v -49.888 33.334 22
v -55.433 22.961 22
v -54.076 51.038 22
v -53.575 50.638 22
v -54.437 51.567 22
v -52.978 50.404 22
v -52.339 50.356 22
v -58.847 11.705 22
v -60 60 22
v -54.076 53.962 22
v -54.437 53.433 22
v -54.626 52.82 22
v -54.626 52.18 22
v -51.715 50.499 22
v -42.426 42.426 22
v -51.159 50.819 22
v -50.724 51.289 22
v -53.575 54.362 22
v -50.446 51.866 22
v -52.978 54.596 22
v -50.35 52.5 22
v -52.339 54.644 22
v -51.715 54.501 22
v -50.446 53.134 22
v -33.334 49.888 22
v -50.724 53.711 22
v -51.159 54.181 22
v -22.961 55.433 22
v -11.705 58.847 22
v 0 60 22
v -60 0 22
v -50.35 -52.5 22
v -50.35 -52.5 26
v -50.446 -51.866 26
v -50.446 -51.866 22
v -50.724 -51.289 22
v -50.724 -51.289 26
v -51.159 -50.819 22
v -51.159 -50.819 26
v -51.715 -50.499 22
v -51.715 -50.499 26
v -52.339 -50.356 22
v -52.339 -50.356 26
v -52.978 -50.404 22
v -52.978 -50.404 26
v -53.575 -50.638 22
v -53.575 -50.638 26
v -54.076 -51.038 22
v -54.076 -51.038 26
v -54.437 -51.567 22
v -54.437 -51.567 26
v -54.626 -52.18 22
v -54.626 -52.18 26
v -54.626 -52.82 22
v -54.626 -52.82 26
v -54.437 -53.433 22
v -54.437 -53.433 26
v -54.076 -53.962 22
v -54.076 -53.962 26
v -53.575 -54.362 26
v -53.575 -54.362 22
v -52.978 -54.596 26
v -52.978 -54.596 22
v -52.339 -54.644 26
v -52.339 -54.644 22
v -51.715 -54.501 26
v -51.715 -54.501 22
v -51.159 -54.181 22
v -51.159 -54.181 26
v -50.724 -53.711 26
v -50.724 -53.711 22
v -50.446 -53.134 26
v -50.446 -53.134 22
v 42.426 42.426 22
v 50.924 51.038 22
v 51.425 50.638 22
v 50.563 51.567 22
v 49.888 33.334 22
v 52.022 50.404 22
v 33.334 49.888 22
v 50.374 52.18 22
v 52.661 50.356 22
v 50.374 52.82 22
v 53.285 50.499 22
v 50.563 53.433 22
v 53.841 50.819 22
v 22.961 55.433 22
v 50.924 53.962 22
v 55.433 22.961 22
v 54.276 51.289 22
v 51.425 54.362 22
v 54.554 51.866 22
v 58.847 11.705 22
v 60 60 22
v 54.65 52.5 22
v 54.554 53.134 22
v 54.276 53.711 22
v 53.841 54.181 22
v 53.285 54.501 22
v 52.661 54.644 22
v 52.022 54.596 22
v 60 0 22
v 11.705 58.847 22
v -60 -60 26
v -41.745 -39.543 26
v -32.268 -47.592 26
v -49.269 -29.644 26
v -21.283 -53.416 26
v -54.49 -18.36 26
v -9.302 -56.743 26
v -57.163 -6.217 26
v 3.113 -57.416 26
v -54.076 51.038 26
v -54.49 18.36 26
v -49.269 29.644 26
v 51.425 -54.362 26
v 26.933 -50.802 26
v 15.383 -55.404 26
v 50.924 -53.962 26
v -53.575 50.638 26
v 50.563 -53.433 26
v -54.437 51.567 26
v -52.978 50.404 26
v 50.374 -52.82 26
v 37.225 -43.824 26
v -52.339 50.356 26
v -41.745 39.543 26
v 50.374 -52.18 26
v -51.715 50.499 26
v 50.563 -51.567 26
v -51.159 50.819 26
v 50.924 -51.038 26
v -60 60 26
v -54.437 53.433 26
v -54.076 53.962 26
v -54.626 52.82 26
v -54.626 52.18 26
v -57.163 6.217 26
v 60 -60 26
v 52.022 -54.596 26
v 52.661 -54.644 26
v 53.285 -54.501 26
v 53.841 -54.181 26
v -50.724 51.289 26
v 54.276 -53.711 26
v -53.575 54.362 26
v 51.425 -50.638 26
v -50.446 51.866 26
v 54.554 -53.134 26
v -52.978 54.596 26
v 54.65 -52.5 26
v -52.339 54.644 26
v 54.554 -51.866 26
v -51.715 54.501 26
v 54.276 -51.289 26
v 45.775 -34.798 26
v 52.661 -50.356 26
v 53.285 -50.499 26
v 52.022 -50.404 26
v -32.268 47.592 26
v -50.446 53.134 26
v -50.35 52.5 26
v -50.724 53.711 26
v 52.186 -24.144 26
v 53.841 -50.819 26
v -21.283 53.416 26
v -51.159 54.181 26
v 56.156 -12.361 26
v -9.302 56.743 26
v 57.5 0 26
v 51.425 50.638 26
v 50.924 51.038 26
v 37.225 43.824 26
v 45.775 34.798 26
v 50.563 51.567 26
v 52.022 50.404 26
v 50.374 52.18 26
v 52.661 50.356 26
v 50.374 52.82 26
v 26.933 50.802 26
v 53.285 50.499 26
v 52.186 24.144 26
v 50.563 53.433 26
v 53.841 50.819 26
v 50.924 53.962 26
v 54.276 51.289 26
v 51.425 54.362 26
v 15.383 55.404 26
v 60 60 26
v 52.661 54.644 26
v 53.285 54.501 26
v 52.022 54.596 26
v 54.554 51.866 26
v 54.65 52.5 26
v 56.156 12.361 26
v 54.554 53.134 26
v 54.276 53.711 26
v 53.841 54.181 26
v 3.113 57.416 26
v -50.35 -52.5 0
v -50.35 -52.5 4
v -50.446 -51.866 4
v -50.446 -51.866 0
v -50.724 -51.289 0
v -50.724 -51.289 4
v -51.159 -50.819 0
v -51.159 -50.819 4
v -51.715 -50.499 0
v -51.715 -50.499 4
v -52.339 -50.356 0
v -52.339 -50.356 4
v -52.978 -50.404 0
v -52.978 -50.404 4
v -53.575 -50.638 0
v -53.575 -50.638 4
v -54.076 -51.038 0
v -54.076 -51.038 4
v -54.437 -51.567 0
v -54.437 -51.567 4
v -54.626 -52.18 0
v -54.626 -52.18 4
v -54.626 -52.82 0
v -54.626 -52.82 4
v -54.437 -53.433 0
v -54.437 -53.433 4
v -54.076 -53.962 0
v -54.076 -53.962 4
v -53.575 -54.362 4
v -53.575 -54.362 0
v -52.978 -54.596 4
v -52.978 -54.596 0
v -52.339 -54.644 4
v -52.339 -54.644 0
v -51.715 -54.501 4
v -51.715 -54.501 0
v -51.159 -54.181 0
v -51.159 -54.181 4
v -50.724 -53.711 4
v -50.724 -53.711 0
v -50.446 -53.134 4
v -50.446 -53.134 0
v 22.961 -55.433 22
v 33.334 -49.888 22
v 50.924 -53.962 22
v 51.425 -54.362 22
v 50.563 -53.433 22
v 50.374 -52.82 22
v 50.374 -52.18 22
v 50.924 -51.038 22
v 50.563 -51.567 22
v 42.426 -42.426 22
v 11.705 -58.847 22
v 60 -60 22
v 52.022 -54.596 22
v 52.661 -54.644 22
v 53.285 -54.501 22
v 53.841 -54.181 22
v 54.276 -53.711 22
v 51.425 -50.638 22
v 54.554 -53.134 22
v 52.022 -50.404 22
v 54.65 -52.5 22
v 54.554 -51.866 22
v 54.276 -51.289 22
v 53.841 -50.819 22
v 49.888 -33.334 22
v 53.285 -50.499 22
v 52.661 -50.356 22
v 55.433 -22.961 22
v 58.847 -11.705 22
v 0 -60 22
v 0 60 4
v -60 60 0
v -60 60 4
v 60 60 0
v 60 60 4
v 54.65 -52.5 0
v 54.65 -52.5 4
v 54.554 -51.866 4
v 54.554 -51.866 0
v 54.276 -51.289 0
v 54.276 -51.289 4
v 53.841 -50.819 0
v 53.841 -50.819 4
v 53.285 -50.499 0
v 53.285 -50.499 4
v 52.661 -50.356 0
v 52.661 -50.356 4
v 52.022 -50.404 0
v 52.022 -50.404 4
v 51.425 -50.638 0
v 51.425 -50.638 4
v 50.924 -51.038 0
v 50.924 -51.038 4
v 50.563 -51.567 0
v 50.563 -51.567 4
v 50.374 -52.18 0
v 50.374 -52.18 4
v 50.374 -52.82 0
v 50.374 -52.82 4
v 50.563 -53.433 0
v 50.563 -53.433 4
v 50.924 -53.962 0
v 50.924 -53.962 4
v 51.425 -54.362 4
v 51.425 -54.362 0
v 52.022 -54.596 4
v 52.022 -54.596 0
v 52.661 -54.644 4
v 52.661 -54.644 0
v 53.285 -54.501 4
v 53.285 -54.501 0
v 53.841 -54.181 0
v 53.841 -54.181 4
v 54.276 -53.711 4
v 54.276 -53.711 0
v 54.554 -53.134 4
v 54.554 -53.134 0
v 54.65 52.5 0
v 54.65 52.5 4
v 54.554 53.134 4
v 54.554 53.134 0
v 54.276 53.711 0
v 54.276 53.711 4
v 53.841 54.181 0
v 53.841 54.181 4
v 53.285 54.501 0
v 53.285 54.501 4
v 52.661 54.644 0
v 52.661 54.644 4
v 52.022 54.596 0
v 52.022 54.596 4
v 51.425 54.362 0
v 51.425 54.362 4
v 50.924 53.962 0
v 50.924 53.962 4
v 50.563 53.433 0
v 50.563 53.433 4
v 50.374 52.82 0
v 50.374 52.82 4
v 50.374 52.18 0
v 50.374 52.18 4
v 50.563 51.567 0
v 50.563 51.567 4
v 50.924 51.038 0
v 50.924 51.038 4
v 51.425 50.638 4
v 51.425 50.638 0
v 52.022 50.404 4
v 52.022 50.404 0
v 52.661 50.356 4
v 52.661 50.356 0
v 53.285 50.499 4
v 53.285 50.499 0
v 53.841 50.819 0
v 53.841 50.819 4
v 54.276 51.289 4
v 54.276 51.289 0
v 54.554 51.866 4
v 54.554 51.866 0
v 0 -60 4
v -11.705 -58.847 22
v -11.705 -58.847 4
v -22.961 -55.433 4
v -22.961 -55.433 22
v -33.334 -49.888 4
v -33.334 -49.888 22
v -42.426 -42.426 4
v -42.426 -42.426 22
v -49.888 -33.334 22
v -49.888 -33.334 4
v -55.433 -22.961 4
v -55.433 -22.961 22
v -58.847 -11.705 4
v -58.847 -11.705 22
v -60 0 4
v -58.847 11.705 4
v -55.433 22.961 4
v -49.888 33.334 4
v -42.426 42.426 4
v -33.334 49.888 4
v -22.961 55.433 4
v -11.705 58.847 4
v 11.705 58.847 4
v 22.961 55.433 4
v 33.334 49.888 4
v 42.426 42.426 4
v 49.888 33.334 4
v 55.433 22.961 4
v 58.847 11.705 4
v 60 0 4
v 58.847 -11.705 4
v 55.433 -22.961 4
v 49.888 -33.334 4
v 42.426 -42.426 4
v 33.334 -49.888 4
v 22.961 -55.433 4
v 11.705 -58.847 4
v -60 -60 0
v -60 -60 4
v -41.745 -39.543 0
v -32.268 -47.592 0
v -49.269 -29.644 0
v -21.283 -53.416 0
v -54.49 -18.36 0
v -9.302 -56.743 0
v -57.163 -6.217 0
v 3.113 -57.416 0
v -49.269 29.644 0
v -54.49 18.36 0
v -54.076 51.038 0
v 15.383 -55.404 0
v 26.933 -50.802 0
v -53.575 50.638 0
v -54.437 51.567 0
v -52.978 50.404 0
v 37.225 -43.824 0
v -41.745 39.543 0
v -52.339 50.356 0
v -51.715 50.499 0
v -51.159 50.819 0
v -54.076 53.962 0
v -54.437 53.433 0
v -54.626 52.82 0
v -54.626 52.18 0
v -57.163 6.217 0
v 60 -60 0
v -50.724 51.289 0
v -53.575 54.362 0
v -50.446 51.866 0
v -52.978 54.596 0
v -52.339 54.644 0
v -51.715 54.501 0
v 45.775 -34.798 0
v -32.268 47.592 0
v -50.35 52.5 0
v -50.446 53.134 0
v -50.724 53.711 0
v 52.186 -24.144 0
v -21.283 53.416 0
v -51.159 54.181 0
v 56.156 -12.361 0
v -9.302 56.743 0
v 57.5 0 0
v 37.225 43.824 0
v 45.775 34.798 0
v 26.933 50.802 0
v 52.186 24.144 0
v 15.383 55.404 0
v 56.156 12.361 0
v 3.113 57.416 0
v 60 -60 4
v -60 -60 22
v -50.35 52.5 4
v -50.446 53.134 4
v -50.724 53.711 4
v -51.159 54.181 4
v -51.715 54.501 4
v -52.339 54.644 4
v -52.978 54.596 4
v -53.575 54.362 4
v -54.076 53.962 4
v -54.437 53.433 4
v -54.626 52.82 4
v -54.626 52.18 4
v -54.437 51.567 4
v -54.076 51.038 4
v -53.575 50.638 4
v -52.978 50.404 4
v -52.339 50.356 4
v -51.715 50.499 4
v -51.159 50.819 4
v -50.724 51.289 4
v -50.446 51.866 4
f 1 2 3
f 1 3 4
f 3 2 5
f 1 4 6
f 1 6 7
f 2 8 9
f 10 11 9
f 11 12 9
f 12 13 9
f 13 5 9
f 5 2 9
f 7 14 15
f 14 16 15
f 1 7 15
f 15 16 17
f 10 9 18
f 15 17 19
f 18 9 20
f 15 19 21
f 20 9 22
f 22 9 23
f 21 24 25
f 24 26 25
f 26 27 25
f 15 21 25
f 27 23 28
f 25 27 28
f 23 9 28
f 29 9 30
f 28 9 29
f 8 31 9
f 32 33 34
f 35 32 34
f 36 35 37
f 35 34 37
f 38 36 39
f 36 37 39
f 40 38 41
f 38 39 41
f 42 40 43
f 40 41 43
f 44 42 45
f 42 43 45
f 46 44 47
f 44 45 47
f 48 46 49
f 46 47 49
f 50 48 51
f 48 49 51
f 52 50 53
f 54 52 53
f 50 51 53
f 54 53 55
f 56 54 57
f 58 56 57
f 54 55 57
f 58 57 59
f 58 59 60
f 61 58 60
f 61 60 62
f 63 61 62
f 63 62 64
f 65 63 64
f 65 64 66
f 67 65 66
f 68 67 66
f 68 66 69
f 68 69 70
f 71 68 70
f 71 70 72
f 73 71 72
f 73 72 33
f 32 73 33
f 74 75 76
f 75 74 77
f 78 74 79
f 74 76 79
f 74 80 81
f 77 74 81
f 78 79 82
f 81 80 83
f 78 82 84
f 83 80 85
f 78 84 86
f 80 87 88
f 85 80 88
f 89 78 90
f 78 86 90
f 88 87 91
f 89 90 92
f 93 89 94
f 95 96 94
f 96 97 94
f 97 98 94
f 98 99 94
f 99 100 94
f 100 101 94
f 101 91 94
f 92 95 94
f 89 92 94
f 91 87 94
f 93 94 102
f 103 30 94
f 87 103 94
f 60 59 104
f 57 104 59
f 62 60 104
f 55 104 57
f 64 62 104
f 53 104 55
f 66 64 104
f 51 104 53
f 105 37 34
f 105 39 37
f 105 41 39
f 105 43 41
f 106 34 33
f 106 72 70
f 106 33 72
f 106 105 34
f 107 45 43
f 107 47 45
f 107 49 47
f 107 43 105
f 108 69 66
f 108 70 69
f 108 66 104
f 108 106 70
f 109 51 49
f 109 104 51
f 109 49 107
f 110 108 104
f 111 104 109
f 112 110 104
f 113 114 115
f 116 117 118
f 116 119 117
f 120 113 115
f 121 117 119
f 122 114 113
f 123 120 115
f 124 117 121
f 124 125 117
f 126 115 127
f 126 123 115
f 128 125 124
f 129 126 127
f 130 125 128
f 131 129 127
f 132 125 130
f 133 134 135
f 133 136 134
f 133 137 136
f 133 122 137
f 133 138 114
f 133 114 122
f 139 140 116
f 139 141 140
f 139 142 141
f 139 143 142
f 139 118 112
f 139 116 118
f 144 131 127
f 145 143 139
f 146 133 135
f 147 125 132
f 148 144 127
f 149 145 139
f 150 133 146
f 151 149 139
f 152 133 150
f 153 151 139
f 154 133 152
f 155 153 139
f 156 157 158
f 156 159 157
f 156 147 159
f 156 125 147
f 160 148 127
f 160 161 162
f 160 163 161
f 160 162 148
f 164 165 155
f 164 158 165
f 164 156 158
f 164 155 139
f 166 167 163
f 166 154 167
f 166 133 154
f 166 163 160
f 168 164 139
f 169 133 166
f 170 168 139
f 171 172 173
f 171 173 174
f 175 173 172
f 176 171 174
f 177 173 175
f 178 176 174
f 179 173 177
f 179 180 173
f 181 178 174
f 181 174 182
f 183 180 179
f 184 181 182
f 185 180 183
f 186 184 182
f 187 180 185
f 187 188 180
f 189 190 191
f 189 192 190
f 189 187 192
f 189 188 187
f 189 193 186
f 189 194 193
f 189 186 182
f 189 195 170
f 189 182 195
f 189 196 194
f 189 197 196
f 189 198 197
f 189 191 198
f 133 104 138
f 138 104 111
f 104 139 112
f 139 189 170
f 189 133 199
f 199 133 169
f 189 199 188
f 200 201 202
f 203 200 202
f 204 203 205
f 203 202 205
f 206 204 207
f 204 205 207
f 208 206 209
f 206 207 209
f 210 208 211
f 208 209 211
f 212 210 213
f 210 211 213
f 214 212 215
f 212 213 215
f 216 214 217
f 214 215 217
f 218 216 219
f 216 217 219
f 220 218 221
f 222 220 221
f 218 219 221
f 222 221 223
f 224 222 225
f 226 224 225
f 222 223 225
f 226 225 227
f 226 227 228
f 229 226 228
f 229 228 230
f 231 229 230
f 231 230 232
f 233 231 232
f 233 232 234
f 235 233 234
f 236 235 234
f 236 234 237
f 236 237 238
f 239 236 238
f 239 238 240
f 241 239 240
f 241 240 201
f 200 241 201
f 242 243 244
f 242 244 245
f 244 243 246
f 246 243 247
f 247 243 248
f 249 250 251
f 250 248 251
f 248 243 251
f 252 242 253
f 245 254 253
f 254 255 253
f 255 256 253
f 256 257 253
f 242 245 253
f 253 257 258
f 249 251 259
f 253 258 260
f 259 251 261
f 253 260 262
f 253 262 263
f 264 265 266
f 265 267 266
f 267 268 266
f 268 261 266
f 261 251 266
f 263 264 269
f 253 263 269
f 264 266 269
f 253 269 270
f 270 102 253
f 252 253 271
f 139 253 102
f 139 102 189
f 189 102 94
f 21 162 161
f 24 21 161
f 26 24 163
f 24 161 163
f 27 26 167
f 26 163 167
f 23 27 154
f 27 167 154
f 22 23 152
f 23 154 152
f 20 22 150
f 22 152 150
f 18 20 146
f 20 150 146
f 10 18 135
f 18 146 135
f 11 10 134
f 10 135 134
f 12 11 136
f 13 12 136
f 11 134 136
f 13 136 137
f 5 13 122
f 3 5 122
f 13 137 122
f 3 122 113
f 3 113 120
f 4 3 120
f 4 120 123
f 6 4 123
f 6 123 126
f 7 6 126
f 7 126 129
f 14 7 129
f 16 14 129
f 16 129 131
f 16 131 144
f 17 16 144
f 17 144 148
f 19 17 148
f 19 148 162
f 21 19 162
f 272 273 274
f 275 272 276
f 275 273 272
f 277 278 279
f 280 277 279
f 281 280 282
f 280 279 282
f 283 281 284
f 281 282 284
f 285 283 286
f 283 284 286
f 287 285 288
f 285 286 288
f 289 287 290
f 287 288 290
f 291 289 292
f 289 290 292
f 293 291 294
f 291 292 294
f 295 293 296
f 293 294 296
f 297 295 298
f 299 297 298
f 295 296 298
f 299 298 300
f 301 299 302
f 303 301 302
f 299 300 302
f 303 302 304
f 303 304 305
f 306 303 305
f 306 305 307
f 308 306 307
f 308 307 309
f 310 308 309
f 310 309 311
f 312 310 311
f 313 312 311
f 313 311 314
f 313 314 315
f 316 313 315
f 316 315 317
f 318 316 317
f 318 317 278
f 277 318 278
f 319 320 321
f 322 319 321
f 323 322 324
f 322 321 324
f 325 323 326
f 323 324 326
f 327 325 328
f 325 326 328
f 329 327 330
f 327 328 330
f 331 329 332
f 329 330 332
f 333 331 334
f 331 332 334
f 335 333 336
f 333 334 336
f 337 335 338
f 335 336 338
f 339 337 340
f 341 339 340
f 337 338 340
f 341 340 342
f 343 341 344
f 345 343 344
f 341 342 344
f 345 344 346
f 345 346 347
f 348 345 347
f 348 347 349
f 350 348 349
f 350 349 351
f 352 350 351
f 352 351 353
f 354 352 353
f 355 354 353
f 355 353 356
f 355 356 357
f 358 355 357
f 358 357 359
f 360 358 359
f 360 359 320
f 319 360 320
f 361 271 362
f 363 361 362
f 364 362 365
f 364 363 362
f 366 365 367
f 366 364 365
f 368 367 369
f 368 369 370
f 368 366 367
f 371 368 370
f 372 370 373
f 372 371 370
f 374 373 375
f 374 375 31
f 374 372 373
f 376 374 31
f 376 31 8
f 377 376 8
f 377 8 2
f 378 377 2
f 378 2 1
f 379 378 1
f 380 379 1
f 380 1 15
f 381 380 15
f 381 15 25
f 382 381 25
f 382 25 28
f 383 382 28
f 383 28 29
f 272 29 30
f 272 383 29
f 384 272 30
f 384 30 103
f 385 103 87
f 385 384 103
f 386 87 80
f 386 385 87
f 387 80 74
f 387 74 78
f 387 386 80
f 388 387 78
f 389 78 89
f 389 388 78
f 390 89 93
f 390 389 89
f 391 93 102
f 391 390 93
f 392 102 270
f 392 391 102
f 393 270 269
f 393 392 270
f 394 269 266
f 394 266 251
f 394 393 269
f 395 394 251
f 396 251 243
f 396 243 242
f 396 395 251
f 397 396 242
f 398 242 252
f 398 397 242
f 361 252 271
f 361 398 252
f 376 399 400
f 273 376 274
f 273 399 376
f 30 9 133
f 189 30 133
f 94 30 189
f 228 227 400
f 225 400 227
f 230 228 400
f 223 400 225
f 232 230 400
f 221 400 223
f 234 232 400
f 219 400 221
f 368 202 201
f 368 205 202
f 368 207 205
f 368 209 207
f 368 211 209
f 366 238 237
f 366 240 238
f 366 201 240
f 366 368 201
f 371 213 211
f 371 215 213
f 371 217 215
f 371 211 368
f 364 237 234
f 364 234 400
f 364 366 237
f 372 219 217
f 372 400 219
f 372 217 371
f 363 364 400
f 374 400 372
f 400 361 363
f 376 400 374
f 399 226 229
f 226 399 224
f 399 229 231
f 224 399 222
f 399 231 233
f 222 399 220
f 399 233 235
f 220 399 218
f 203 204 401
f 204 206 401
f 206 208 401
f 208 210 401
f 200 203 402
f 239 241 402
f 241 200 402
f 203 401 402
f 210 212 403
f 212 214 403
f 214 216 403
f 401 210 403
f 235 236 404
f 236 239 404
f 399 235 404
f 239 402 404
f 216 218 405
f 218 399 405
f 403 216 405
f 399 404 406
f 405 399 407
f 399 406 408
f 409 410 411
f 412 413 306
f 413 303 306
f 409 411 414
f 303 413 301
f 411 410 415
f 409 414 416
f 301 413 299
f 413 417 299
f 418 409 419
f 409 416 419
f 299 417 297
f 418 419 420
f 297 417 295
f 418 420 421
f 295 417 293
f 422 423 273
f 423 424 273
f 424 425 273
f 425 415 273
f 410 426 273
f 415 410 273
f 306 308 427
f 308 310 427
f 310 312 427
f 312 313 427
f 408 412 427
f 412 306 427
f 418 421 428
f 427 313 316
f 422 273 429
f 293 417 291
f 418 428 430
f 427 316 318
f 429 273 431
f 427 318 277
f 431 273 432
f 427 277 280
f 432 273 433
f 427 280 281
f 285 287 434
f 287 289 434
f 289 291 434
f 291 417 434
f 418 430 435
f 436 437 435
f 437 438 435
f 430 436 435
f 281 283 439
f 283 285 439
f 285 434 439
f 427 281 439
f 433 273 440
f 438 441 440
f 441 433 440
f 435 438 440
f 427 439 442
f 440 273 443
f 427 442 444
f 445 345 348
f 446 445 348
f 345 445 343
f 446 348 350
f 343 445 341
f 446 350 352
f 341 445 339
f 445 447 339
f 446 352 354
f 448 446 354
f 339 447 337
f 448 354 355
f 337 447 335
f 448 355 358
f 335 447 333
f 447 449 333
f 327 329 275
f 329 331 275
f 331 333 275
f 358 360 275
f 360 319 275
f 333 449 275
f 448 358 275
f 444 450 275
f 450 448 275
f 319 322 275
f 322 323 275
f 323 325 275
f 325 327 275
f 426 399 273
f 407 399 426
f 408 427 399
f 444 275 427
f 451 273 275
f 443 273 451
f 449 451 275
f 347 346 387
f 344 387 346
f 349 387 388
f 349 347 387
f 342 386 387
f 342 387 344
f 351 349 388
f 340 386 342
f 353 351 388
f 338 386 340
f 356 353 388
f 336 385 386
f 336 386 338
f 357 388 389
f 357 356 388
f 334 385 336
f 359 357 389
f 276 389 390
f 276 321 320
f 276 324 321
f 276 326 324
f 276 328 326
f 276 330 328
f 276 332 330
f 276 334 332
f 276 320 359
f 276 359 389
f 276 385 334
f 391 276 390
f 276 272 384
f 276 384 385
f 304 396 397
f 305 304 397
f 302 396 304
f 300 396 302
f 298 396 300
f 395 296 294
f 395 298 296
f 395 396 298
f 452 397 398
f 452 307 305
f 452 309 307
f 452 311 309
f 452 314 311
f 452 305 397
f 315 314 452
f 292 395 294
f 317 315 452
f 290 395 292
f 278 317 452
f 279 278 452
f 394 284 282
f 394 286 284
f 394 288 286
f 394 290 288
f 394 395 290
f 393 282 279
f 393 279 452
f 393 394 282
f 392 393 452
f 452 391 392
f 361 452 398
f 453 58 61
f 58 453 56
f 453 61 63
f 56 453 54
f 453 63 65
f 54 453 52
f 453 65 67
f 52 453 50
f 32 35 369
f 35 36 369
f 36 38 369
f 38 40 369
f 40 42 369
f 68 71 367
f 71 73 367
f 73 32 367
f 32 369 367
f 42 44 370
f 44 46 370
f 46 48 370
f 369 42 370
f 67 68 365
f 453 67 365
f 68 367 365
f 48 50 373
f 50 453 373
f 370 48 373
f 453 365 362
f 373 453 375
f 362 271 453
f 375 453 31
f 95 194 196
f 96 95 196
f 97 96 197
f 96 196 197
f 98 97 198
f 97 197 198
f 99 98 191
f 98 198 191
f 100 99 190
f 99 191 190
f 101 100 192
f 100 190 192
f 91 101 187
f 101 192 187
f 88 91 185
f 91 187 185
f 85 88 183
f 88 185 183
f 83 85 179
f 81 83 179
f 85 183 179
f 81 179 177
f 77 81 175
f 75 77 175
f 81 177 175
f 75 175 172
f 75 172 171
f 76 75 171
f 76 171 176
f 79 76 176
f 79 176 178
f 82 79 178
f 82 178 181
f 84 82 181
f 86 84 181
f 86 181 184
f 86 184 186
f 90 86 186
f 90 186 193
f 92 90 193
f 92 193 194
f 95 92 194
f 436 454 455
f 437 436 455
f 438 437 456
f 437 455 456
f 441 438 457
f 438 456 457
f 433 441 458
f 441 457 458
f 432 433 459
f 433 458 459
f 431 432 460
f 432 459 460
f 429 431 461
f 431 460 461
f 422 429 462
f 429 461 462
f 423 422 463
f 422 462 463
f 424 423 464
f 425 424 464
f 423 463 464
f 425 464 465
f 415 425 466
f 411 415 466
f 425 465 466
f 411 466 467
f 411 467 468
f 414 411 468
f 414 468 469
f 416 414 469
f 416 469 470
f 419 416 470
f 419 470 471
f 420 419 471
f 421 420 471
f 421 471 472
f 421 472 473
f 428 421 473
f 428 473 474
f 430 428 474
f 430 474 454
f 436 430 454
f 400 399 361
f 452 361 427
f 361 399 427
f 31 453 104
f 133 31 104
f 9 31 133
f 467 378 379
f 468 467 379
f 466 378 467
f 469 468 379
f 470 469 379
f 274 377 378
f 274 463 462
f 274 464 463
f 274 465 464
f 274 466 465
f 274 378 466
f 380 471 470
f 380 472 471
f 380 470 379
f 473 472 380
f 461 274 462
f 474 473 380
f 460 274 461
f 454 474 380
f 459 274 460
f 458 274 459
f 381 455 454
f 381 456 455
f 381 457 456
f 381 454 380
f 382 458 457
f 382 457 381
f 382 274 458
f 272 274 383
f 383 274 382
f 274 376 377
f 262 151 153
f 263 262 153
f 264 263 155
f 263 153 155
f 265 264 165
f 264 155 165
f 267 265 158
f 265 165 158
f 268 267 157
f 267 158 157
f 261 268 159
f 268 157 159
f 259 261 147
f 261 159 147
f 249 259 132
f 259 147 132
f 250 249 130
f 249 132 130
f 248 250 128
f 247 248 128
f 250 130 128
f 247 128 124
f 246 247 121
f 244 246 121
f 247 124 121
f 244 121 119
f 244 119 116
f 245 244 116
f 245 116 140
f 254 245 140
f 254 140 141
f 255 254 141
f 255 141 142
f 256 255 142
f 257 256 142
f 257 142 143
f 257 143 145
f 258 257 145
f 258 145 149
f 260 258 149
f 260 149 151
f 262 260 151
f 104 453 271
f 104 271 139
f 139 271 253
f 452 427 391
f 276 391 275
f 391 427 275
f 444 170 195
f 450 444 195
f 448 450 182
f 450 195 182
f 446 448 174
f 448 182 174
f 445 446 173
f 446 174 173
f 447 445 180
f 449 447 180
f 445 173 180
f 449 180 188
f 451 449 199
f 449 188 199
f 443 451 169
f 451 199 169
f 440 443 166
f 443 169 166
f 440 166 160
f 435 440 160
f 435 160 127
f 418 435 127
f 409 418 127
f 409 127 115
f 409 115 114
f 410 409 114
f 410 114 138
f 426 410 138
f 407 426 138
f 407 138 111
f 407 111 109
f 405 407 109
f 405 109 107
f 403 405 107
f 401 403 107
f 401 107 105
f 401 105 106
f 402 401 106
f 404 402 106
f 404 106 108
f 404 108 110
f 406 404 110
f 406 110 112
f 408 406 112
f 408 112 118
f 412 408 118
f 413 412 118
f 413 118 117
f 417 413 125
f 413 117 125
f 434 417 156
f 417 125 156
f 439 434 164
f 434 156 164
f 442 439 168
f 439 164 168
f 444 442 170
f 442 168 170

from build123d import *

# Parameters (mm, degrees)
F0_W     = 120
F0_H     = 120
F1_DEPTH = 26
F2_R     = 57.5
F3_DEPTH = 26.001
F6_DEPTH = 18
F7_R     = 2.15
F8_DEPTH = 26.001


with BuildPart() as f1:
    # F0 (on Top) → F1 (new body)
    with BuildSketch(Plane.XY):
        Rectangle(F0_W, F0_H)
    extrude(amount=F1_DEPTH)

    # F2 (on face) → F3 (cut, through all)
    with BuildSketch(Plane.XY.offset(26)):
        Circle(F2_R)
    extrude(amount=-F3_DEPTH, mode=Mode.SUBTRACT)

    # F5 (on offset) → F6 (cut)
    with BuildSketch(Plane.XY.offset(4)):
        with BuildLine():
            ThreePointArc((0, 60), (42.4264068712, 42.4264068712), (60, 0))
            Line((60, 0), (60, 60))
            Line((60, 60), (0, 60))
        make_face()
        with BuildLine():
            Line((60, -60), (60, 0))
            ThreePointArc((60, 0), (42.4264067803, -42.426406962), (-2.57e-07, -60))
            Line((-2.57e-07, -60), (60, -60))
        make_face()
        with BuildLine():
            Line((-60, -60), (-2.57e-07, -60))
            ThreePointArc((-2.57e-07, -60), (-42.4264070618, -42.4264066806), (-60, 2.822e-07))
            Line((-60, 2.822e-07), (-60, -60))
        make_face()
        with BuildLine():
            ThreePointArc((-60, 2.822e-07), (-42.4264067714, 42.426406971), (0, 60))
            Line((0, 60), (-60, 60))
            Line((-60, 60), (-60, 2.822e-07))
        make_face()
    extrude(amount=F6_DEPTH, mode=Mode.SUBTRACT)

    # F7 (on face) → F8 (cut, through all)
    with BuildSketch(Plane.XY.offset(26)):
        with Locations((-52.5, 52.5)):
            Circle(F7_R)
        with Locations((52.5, 52.5)):
            Circle(F7_R)
        with Locations((52.5, -52.5)):
            Circle(F7_R)
        with Locations((-52.5, -52.5)):
            Circle(F7_R)
    extrude(amount=-F8_DEPTH, mode=Mode.SUBTRACT)


solid = f1.part
